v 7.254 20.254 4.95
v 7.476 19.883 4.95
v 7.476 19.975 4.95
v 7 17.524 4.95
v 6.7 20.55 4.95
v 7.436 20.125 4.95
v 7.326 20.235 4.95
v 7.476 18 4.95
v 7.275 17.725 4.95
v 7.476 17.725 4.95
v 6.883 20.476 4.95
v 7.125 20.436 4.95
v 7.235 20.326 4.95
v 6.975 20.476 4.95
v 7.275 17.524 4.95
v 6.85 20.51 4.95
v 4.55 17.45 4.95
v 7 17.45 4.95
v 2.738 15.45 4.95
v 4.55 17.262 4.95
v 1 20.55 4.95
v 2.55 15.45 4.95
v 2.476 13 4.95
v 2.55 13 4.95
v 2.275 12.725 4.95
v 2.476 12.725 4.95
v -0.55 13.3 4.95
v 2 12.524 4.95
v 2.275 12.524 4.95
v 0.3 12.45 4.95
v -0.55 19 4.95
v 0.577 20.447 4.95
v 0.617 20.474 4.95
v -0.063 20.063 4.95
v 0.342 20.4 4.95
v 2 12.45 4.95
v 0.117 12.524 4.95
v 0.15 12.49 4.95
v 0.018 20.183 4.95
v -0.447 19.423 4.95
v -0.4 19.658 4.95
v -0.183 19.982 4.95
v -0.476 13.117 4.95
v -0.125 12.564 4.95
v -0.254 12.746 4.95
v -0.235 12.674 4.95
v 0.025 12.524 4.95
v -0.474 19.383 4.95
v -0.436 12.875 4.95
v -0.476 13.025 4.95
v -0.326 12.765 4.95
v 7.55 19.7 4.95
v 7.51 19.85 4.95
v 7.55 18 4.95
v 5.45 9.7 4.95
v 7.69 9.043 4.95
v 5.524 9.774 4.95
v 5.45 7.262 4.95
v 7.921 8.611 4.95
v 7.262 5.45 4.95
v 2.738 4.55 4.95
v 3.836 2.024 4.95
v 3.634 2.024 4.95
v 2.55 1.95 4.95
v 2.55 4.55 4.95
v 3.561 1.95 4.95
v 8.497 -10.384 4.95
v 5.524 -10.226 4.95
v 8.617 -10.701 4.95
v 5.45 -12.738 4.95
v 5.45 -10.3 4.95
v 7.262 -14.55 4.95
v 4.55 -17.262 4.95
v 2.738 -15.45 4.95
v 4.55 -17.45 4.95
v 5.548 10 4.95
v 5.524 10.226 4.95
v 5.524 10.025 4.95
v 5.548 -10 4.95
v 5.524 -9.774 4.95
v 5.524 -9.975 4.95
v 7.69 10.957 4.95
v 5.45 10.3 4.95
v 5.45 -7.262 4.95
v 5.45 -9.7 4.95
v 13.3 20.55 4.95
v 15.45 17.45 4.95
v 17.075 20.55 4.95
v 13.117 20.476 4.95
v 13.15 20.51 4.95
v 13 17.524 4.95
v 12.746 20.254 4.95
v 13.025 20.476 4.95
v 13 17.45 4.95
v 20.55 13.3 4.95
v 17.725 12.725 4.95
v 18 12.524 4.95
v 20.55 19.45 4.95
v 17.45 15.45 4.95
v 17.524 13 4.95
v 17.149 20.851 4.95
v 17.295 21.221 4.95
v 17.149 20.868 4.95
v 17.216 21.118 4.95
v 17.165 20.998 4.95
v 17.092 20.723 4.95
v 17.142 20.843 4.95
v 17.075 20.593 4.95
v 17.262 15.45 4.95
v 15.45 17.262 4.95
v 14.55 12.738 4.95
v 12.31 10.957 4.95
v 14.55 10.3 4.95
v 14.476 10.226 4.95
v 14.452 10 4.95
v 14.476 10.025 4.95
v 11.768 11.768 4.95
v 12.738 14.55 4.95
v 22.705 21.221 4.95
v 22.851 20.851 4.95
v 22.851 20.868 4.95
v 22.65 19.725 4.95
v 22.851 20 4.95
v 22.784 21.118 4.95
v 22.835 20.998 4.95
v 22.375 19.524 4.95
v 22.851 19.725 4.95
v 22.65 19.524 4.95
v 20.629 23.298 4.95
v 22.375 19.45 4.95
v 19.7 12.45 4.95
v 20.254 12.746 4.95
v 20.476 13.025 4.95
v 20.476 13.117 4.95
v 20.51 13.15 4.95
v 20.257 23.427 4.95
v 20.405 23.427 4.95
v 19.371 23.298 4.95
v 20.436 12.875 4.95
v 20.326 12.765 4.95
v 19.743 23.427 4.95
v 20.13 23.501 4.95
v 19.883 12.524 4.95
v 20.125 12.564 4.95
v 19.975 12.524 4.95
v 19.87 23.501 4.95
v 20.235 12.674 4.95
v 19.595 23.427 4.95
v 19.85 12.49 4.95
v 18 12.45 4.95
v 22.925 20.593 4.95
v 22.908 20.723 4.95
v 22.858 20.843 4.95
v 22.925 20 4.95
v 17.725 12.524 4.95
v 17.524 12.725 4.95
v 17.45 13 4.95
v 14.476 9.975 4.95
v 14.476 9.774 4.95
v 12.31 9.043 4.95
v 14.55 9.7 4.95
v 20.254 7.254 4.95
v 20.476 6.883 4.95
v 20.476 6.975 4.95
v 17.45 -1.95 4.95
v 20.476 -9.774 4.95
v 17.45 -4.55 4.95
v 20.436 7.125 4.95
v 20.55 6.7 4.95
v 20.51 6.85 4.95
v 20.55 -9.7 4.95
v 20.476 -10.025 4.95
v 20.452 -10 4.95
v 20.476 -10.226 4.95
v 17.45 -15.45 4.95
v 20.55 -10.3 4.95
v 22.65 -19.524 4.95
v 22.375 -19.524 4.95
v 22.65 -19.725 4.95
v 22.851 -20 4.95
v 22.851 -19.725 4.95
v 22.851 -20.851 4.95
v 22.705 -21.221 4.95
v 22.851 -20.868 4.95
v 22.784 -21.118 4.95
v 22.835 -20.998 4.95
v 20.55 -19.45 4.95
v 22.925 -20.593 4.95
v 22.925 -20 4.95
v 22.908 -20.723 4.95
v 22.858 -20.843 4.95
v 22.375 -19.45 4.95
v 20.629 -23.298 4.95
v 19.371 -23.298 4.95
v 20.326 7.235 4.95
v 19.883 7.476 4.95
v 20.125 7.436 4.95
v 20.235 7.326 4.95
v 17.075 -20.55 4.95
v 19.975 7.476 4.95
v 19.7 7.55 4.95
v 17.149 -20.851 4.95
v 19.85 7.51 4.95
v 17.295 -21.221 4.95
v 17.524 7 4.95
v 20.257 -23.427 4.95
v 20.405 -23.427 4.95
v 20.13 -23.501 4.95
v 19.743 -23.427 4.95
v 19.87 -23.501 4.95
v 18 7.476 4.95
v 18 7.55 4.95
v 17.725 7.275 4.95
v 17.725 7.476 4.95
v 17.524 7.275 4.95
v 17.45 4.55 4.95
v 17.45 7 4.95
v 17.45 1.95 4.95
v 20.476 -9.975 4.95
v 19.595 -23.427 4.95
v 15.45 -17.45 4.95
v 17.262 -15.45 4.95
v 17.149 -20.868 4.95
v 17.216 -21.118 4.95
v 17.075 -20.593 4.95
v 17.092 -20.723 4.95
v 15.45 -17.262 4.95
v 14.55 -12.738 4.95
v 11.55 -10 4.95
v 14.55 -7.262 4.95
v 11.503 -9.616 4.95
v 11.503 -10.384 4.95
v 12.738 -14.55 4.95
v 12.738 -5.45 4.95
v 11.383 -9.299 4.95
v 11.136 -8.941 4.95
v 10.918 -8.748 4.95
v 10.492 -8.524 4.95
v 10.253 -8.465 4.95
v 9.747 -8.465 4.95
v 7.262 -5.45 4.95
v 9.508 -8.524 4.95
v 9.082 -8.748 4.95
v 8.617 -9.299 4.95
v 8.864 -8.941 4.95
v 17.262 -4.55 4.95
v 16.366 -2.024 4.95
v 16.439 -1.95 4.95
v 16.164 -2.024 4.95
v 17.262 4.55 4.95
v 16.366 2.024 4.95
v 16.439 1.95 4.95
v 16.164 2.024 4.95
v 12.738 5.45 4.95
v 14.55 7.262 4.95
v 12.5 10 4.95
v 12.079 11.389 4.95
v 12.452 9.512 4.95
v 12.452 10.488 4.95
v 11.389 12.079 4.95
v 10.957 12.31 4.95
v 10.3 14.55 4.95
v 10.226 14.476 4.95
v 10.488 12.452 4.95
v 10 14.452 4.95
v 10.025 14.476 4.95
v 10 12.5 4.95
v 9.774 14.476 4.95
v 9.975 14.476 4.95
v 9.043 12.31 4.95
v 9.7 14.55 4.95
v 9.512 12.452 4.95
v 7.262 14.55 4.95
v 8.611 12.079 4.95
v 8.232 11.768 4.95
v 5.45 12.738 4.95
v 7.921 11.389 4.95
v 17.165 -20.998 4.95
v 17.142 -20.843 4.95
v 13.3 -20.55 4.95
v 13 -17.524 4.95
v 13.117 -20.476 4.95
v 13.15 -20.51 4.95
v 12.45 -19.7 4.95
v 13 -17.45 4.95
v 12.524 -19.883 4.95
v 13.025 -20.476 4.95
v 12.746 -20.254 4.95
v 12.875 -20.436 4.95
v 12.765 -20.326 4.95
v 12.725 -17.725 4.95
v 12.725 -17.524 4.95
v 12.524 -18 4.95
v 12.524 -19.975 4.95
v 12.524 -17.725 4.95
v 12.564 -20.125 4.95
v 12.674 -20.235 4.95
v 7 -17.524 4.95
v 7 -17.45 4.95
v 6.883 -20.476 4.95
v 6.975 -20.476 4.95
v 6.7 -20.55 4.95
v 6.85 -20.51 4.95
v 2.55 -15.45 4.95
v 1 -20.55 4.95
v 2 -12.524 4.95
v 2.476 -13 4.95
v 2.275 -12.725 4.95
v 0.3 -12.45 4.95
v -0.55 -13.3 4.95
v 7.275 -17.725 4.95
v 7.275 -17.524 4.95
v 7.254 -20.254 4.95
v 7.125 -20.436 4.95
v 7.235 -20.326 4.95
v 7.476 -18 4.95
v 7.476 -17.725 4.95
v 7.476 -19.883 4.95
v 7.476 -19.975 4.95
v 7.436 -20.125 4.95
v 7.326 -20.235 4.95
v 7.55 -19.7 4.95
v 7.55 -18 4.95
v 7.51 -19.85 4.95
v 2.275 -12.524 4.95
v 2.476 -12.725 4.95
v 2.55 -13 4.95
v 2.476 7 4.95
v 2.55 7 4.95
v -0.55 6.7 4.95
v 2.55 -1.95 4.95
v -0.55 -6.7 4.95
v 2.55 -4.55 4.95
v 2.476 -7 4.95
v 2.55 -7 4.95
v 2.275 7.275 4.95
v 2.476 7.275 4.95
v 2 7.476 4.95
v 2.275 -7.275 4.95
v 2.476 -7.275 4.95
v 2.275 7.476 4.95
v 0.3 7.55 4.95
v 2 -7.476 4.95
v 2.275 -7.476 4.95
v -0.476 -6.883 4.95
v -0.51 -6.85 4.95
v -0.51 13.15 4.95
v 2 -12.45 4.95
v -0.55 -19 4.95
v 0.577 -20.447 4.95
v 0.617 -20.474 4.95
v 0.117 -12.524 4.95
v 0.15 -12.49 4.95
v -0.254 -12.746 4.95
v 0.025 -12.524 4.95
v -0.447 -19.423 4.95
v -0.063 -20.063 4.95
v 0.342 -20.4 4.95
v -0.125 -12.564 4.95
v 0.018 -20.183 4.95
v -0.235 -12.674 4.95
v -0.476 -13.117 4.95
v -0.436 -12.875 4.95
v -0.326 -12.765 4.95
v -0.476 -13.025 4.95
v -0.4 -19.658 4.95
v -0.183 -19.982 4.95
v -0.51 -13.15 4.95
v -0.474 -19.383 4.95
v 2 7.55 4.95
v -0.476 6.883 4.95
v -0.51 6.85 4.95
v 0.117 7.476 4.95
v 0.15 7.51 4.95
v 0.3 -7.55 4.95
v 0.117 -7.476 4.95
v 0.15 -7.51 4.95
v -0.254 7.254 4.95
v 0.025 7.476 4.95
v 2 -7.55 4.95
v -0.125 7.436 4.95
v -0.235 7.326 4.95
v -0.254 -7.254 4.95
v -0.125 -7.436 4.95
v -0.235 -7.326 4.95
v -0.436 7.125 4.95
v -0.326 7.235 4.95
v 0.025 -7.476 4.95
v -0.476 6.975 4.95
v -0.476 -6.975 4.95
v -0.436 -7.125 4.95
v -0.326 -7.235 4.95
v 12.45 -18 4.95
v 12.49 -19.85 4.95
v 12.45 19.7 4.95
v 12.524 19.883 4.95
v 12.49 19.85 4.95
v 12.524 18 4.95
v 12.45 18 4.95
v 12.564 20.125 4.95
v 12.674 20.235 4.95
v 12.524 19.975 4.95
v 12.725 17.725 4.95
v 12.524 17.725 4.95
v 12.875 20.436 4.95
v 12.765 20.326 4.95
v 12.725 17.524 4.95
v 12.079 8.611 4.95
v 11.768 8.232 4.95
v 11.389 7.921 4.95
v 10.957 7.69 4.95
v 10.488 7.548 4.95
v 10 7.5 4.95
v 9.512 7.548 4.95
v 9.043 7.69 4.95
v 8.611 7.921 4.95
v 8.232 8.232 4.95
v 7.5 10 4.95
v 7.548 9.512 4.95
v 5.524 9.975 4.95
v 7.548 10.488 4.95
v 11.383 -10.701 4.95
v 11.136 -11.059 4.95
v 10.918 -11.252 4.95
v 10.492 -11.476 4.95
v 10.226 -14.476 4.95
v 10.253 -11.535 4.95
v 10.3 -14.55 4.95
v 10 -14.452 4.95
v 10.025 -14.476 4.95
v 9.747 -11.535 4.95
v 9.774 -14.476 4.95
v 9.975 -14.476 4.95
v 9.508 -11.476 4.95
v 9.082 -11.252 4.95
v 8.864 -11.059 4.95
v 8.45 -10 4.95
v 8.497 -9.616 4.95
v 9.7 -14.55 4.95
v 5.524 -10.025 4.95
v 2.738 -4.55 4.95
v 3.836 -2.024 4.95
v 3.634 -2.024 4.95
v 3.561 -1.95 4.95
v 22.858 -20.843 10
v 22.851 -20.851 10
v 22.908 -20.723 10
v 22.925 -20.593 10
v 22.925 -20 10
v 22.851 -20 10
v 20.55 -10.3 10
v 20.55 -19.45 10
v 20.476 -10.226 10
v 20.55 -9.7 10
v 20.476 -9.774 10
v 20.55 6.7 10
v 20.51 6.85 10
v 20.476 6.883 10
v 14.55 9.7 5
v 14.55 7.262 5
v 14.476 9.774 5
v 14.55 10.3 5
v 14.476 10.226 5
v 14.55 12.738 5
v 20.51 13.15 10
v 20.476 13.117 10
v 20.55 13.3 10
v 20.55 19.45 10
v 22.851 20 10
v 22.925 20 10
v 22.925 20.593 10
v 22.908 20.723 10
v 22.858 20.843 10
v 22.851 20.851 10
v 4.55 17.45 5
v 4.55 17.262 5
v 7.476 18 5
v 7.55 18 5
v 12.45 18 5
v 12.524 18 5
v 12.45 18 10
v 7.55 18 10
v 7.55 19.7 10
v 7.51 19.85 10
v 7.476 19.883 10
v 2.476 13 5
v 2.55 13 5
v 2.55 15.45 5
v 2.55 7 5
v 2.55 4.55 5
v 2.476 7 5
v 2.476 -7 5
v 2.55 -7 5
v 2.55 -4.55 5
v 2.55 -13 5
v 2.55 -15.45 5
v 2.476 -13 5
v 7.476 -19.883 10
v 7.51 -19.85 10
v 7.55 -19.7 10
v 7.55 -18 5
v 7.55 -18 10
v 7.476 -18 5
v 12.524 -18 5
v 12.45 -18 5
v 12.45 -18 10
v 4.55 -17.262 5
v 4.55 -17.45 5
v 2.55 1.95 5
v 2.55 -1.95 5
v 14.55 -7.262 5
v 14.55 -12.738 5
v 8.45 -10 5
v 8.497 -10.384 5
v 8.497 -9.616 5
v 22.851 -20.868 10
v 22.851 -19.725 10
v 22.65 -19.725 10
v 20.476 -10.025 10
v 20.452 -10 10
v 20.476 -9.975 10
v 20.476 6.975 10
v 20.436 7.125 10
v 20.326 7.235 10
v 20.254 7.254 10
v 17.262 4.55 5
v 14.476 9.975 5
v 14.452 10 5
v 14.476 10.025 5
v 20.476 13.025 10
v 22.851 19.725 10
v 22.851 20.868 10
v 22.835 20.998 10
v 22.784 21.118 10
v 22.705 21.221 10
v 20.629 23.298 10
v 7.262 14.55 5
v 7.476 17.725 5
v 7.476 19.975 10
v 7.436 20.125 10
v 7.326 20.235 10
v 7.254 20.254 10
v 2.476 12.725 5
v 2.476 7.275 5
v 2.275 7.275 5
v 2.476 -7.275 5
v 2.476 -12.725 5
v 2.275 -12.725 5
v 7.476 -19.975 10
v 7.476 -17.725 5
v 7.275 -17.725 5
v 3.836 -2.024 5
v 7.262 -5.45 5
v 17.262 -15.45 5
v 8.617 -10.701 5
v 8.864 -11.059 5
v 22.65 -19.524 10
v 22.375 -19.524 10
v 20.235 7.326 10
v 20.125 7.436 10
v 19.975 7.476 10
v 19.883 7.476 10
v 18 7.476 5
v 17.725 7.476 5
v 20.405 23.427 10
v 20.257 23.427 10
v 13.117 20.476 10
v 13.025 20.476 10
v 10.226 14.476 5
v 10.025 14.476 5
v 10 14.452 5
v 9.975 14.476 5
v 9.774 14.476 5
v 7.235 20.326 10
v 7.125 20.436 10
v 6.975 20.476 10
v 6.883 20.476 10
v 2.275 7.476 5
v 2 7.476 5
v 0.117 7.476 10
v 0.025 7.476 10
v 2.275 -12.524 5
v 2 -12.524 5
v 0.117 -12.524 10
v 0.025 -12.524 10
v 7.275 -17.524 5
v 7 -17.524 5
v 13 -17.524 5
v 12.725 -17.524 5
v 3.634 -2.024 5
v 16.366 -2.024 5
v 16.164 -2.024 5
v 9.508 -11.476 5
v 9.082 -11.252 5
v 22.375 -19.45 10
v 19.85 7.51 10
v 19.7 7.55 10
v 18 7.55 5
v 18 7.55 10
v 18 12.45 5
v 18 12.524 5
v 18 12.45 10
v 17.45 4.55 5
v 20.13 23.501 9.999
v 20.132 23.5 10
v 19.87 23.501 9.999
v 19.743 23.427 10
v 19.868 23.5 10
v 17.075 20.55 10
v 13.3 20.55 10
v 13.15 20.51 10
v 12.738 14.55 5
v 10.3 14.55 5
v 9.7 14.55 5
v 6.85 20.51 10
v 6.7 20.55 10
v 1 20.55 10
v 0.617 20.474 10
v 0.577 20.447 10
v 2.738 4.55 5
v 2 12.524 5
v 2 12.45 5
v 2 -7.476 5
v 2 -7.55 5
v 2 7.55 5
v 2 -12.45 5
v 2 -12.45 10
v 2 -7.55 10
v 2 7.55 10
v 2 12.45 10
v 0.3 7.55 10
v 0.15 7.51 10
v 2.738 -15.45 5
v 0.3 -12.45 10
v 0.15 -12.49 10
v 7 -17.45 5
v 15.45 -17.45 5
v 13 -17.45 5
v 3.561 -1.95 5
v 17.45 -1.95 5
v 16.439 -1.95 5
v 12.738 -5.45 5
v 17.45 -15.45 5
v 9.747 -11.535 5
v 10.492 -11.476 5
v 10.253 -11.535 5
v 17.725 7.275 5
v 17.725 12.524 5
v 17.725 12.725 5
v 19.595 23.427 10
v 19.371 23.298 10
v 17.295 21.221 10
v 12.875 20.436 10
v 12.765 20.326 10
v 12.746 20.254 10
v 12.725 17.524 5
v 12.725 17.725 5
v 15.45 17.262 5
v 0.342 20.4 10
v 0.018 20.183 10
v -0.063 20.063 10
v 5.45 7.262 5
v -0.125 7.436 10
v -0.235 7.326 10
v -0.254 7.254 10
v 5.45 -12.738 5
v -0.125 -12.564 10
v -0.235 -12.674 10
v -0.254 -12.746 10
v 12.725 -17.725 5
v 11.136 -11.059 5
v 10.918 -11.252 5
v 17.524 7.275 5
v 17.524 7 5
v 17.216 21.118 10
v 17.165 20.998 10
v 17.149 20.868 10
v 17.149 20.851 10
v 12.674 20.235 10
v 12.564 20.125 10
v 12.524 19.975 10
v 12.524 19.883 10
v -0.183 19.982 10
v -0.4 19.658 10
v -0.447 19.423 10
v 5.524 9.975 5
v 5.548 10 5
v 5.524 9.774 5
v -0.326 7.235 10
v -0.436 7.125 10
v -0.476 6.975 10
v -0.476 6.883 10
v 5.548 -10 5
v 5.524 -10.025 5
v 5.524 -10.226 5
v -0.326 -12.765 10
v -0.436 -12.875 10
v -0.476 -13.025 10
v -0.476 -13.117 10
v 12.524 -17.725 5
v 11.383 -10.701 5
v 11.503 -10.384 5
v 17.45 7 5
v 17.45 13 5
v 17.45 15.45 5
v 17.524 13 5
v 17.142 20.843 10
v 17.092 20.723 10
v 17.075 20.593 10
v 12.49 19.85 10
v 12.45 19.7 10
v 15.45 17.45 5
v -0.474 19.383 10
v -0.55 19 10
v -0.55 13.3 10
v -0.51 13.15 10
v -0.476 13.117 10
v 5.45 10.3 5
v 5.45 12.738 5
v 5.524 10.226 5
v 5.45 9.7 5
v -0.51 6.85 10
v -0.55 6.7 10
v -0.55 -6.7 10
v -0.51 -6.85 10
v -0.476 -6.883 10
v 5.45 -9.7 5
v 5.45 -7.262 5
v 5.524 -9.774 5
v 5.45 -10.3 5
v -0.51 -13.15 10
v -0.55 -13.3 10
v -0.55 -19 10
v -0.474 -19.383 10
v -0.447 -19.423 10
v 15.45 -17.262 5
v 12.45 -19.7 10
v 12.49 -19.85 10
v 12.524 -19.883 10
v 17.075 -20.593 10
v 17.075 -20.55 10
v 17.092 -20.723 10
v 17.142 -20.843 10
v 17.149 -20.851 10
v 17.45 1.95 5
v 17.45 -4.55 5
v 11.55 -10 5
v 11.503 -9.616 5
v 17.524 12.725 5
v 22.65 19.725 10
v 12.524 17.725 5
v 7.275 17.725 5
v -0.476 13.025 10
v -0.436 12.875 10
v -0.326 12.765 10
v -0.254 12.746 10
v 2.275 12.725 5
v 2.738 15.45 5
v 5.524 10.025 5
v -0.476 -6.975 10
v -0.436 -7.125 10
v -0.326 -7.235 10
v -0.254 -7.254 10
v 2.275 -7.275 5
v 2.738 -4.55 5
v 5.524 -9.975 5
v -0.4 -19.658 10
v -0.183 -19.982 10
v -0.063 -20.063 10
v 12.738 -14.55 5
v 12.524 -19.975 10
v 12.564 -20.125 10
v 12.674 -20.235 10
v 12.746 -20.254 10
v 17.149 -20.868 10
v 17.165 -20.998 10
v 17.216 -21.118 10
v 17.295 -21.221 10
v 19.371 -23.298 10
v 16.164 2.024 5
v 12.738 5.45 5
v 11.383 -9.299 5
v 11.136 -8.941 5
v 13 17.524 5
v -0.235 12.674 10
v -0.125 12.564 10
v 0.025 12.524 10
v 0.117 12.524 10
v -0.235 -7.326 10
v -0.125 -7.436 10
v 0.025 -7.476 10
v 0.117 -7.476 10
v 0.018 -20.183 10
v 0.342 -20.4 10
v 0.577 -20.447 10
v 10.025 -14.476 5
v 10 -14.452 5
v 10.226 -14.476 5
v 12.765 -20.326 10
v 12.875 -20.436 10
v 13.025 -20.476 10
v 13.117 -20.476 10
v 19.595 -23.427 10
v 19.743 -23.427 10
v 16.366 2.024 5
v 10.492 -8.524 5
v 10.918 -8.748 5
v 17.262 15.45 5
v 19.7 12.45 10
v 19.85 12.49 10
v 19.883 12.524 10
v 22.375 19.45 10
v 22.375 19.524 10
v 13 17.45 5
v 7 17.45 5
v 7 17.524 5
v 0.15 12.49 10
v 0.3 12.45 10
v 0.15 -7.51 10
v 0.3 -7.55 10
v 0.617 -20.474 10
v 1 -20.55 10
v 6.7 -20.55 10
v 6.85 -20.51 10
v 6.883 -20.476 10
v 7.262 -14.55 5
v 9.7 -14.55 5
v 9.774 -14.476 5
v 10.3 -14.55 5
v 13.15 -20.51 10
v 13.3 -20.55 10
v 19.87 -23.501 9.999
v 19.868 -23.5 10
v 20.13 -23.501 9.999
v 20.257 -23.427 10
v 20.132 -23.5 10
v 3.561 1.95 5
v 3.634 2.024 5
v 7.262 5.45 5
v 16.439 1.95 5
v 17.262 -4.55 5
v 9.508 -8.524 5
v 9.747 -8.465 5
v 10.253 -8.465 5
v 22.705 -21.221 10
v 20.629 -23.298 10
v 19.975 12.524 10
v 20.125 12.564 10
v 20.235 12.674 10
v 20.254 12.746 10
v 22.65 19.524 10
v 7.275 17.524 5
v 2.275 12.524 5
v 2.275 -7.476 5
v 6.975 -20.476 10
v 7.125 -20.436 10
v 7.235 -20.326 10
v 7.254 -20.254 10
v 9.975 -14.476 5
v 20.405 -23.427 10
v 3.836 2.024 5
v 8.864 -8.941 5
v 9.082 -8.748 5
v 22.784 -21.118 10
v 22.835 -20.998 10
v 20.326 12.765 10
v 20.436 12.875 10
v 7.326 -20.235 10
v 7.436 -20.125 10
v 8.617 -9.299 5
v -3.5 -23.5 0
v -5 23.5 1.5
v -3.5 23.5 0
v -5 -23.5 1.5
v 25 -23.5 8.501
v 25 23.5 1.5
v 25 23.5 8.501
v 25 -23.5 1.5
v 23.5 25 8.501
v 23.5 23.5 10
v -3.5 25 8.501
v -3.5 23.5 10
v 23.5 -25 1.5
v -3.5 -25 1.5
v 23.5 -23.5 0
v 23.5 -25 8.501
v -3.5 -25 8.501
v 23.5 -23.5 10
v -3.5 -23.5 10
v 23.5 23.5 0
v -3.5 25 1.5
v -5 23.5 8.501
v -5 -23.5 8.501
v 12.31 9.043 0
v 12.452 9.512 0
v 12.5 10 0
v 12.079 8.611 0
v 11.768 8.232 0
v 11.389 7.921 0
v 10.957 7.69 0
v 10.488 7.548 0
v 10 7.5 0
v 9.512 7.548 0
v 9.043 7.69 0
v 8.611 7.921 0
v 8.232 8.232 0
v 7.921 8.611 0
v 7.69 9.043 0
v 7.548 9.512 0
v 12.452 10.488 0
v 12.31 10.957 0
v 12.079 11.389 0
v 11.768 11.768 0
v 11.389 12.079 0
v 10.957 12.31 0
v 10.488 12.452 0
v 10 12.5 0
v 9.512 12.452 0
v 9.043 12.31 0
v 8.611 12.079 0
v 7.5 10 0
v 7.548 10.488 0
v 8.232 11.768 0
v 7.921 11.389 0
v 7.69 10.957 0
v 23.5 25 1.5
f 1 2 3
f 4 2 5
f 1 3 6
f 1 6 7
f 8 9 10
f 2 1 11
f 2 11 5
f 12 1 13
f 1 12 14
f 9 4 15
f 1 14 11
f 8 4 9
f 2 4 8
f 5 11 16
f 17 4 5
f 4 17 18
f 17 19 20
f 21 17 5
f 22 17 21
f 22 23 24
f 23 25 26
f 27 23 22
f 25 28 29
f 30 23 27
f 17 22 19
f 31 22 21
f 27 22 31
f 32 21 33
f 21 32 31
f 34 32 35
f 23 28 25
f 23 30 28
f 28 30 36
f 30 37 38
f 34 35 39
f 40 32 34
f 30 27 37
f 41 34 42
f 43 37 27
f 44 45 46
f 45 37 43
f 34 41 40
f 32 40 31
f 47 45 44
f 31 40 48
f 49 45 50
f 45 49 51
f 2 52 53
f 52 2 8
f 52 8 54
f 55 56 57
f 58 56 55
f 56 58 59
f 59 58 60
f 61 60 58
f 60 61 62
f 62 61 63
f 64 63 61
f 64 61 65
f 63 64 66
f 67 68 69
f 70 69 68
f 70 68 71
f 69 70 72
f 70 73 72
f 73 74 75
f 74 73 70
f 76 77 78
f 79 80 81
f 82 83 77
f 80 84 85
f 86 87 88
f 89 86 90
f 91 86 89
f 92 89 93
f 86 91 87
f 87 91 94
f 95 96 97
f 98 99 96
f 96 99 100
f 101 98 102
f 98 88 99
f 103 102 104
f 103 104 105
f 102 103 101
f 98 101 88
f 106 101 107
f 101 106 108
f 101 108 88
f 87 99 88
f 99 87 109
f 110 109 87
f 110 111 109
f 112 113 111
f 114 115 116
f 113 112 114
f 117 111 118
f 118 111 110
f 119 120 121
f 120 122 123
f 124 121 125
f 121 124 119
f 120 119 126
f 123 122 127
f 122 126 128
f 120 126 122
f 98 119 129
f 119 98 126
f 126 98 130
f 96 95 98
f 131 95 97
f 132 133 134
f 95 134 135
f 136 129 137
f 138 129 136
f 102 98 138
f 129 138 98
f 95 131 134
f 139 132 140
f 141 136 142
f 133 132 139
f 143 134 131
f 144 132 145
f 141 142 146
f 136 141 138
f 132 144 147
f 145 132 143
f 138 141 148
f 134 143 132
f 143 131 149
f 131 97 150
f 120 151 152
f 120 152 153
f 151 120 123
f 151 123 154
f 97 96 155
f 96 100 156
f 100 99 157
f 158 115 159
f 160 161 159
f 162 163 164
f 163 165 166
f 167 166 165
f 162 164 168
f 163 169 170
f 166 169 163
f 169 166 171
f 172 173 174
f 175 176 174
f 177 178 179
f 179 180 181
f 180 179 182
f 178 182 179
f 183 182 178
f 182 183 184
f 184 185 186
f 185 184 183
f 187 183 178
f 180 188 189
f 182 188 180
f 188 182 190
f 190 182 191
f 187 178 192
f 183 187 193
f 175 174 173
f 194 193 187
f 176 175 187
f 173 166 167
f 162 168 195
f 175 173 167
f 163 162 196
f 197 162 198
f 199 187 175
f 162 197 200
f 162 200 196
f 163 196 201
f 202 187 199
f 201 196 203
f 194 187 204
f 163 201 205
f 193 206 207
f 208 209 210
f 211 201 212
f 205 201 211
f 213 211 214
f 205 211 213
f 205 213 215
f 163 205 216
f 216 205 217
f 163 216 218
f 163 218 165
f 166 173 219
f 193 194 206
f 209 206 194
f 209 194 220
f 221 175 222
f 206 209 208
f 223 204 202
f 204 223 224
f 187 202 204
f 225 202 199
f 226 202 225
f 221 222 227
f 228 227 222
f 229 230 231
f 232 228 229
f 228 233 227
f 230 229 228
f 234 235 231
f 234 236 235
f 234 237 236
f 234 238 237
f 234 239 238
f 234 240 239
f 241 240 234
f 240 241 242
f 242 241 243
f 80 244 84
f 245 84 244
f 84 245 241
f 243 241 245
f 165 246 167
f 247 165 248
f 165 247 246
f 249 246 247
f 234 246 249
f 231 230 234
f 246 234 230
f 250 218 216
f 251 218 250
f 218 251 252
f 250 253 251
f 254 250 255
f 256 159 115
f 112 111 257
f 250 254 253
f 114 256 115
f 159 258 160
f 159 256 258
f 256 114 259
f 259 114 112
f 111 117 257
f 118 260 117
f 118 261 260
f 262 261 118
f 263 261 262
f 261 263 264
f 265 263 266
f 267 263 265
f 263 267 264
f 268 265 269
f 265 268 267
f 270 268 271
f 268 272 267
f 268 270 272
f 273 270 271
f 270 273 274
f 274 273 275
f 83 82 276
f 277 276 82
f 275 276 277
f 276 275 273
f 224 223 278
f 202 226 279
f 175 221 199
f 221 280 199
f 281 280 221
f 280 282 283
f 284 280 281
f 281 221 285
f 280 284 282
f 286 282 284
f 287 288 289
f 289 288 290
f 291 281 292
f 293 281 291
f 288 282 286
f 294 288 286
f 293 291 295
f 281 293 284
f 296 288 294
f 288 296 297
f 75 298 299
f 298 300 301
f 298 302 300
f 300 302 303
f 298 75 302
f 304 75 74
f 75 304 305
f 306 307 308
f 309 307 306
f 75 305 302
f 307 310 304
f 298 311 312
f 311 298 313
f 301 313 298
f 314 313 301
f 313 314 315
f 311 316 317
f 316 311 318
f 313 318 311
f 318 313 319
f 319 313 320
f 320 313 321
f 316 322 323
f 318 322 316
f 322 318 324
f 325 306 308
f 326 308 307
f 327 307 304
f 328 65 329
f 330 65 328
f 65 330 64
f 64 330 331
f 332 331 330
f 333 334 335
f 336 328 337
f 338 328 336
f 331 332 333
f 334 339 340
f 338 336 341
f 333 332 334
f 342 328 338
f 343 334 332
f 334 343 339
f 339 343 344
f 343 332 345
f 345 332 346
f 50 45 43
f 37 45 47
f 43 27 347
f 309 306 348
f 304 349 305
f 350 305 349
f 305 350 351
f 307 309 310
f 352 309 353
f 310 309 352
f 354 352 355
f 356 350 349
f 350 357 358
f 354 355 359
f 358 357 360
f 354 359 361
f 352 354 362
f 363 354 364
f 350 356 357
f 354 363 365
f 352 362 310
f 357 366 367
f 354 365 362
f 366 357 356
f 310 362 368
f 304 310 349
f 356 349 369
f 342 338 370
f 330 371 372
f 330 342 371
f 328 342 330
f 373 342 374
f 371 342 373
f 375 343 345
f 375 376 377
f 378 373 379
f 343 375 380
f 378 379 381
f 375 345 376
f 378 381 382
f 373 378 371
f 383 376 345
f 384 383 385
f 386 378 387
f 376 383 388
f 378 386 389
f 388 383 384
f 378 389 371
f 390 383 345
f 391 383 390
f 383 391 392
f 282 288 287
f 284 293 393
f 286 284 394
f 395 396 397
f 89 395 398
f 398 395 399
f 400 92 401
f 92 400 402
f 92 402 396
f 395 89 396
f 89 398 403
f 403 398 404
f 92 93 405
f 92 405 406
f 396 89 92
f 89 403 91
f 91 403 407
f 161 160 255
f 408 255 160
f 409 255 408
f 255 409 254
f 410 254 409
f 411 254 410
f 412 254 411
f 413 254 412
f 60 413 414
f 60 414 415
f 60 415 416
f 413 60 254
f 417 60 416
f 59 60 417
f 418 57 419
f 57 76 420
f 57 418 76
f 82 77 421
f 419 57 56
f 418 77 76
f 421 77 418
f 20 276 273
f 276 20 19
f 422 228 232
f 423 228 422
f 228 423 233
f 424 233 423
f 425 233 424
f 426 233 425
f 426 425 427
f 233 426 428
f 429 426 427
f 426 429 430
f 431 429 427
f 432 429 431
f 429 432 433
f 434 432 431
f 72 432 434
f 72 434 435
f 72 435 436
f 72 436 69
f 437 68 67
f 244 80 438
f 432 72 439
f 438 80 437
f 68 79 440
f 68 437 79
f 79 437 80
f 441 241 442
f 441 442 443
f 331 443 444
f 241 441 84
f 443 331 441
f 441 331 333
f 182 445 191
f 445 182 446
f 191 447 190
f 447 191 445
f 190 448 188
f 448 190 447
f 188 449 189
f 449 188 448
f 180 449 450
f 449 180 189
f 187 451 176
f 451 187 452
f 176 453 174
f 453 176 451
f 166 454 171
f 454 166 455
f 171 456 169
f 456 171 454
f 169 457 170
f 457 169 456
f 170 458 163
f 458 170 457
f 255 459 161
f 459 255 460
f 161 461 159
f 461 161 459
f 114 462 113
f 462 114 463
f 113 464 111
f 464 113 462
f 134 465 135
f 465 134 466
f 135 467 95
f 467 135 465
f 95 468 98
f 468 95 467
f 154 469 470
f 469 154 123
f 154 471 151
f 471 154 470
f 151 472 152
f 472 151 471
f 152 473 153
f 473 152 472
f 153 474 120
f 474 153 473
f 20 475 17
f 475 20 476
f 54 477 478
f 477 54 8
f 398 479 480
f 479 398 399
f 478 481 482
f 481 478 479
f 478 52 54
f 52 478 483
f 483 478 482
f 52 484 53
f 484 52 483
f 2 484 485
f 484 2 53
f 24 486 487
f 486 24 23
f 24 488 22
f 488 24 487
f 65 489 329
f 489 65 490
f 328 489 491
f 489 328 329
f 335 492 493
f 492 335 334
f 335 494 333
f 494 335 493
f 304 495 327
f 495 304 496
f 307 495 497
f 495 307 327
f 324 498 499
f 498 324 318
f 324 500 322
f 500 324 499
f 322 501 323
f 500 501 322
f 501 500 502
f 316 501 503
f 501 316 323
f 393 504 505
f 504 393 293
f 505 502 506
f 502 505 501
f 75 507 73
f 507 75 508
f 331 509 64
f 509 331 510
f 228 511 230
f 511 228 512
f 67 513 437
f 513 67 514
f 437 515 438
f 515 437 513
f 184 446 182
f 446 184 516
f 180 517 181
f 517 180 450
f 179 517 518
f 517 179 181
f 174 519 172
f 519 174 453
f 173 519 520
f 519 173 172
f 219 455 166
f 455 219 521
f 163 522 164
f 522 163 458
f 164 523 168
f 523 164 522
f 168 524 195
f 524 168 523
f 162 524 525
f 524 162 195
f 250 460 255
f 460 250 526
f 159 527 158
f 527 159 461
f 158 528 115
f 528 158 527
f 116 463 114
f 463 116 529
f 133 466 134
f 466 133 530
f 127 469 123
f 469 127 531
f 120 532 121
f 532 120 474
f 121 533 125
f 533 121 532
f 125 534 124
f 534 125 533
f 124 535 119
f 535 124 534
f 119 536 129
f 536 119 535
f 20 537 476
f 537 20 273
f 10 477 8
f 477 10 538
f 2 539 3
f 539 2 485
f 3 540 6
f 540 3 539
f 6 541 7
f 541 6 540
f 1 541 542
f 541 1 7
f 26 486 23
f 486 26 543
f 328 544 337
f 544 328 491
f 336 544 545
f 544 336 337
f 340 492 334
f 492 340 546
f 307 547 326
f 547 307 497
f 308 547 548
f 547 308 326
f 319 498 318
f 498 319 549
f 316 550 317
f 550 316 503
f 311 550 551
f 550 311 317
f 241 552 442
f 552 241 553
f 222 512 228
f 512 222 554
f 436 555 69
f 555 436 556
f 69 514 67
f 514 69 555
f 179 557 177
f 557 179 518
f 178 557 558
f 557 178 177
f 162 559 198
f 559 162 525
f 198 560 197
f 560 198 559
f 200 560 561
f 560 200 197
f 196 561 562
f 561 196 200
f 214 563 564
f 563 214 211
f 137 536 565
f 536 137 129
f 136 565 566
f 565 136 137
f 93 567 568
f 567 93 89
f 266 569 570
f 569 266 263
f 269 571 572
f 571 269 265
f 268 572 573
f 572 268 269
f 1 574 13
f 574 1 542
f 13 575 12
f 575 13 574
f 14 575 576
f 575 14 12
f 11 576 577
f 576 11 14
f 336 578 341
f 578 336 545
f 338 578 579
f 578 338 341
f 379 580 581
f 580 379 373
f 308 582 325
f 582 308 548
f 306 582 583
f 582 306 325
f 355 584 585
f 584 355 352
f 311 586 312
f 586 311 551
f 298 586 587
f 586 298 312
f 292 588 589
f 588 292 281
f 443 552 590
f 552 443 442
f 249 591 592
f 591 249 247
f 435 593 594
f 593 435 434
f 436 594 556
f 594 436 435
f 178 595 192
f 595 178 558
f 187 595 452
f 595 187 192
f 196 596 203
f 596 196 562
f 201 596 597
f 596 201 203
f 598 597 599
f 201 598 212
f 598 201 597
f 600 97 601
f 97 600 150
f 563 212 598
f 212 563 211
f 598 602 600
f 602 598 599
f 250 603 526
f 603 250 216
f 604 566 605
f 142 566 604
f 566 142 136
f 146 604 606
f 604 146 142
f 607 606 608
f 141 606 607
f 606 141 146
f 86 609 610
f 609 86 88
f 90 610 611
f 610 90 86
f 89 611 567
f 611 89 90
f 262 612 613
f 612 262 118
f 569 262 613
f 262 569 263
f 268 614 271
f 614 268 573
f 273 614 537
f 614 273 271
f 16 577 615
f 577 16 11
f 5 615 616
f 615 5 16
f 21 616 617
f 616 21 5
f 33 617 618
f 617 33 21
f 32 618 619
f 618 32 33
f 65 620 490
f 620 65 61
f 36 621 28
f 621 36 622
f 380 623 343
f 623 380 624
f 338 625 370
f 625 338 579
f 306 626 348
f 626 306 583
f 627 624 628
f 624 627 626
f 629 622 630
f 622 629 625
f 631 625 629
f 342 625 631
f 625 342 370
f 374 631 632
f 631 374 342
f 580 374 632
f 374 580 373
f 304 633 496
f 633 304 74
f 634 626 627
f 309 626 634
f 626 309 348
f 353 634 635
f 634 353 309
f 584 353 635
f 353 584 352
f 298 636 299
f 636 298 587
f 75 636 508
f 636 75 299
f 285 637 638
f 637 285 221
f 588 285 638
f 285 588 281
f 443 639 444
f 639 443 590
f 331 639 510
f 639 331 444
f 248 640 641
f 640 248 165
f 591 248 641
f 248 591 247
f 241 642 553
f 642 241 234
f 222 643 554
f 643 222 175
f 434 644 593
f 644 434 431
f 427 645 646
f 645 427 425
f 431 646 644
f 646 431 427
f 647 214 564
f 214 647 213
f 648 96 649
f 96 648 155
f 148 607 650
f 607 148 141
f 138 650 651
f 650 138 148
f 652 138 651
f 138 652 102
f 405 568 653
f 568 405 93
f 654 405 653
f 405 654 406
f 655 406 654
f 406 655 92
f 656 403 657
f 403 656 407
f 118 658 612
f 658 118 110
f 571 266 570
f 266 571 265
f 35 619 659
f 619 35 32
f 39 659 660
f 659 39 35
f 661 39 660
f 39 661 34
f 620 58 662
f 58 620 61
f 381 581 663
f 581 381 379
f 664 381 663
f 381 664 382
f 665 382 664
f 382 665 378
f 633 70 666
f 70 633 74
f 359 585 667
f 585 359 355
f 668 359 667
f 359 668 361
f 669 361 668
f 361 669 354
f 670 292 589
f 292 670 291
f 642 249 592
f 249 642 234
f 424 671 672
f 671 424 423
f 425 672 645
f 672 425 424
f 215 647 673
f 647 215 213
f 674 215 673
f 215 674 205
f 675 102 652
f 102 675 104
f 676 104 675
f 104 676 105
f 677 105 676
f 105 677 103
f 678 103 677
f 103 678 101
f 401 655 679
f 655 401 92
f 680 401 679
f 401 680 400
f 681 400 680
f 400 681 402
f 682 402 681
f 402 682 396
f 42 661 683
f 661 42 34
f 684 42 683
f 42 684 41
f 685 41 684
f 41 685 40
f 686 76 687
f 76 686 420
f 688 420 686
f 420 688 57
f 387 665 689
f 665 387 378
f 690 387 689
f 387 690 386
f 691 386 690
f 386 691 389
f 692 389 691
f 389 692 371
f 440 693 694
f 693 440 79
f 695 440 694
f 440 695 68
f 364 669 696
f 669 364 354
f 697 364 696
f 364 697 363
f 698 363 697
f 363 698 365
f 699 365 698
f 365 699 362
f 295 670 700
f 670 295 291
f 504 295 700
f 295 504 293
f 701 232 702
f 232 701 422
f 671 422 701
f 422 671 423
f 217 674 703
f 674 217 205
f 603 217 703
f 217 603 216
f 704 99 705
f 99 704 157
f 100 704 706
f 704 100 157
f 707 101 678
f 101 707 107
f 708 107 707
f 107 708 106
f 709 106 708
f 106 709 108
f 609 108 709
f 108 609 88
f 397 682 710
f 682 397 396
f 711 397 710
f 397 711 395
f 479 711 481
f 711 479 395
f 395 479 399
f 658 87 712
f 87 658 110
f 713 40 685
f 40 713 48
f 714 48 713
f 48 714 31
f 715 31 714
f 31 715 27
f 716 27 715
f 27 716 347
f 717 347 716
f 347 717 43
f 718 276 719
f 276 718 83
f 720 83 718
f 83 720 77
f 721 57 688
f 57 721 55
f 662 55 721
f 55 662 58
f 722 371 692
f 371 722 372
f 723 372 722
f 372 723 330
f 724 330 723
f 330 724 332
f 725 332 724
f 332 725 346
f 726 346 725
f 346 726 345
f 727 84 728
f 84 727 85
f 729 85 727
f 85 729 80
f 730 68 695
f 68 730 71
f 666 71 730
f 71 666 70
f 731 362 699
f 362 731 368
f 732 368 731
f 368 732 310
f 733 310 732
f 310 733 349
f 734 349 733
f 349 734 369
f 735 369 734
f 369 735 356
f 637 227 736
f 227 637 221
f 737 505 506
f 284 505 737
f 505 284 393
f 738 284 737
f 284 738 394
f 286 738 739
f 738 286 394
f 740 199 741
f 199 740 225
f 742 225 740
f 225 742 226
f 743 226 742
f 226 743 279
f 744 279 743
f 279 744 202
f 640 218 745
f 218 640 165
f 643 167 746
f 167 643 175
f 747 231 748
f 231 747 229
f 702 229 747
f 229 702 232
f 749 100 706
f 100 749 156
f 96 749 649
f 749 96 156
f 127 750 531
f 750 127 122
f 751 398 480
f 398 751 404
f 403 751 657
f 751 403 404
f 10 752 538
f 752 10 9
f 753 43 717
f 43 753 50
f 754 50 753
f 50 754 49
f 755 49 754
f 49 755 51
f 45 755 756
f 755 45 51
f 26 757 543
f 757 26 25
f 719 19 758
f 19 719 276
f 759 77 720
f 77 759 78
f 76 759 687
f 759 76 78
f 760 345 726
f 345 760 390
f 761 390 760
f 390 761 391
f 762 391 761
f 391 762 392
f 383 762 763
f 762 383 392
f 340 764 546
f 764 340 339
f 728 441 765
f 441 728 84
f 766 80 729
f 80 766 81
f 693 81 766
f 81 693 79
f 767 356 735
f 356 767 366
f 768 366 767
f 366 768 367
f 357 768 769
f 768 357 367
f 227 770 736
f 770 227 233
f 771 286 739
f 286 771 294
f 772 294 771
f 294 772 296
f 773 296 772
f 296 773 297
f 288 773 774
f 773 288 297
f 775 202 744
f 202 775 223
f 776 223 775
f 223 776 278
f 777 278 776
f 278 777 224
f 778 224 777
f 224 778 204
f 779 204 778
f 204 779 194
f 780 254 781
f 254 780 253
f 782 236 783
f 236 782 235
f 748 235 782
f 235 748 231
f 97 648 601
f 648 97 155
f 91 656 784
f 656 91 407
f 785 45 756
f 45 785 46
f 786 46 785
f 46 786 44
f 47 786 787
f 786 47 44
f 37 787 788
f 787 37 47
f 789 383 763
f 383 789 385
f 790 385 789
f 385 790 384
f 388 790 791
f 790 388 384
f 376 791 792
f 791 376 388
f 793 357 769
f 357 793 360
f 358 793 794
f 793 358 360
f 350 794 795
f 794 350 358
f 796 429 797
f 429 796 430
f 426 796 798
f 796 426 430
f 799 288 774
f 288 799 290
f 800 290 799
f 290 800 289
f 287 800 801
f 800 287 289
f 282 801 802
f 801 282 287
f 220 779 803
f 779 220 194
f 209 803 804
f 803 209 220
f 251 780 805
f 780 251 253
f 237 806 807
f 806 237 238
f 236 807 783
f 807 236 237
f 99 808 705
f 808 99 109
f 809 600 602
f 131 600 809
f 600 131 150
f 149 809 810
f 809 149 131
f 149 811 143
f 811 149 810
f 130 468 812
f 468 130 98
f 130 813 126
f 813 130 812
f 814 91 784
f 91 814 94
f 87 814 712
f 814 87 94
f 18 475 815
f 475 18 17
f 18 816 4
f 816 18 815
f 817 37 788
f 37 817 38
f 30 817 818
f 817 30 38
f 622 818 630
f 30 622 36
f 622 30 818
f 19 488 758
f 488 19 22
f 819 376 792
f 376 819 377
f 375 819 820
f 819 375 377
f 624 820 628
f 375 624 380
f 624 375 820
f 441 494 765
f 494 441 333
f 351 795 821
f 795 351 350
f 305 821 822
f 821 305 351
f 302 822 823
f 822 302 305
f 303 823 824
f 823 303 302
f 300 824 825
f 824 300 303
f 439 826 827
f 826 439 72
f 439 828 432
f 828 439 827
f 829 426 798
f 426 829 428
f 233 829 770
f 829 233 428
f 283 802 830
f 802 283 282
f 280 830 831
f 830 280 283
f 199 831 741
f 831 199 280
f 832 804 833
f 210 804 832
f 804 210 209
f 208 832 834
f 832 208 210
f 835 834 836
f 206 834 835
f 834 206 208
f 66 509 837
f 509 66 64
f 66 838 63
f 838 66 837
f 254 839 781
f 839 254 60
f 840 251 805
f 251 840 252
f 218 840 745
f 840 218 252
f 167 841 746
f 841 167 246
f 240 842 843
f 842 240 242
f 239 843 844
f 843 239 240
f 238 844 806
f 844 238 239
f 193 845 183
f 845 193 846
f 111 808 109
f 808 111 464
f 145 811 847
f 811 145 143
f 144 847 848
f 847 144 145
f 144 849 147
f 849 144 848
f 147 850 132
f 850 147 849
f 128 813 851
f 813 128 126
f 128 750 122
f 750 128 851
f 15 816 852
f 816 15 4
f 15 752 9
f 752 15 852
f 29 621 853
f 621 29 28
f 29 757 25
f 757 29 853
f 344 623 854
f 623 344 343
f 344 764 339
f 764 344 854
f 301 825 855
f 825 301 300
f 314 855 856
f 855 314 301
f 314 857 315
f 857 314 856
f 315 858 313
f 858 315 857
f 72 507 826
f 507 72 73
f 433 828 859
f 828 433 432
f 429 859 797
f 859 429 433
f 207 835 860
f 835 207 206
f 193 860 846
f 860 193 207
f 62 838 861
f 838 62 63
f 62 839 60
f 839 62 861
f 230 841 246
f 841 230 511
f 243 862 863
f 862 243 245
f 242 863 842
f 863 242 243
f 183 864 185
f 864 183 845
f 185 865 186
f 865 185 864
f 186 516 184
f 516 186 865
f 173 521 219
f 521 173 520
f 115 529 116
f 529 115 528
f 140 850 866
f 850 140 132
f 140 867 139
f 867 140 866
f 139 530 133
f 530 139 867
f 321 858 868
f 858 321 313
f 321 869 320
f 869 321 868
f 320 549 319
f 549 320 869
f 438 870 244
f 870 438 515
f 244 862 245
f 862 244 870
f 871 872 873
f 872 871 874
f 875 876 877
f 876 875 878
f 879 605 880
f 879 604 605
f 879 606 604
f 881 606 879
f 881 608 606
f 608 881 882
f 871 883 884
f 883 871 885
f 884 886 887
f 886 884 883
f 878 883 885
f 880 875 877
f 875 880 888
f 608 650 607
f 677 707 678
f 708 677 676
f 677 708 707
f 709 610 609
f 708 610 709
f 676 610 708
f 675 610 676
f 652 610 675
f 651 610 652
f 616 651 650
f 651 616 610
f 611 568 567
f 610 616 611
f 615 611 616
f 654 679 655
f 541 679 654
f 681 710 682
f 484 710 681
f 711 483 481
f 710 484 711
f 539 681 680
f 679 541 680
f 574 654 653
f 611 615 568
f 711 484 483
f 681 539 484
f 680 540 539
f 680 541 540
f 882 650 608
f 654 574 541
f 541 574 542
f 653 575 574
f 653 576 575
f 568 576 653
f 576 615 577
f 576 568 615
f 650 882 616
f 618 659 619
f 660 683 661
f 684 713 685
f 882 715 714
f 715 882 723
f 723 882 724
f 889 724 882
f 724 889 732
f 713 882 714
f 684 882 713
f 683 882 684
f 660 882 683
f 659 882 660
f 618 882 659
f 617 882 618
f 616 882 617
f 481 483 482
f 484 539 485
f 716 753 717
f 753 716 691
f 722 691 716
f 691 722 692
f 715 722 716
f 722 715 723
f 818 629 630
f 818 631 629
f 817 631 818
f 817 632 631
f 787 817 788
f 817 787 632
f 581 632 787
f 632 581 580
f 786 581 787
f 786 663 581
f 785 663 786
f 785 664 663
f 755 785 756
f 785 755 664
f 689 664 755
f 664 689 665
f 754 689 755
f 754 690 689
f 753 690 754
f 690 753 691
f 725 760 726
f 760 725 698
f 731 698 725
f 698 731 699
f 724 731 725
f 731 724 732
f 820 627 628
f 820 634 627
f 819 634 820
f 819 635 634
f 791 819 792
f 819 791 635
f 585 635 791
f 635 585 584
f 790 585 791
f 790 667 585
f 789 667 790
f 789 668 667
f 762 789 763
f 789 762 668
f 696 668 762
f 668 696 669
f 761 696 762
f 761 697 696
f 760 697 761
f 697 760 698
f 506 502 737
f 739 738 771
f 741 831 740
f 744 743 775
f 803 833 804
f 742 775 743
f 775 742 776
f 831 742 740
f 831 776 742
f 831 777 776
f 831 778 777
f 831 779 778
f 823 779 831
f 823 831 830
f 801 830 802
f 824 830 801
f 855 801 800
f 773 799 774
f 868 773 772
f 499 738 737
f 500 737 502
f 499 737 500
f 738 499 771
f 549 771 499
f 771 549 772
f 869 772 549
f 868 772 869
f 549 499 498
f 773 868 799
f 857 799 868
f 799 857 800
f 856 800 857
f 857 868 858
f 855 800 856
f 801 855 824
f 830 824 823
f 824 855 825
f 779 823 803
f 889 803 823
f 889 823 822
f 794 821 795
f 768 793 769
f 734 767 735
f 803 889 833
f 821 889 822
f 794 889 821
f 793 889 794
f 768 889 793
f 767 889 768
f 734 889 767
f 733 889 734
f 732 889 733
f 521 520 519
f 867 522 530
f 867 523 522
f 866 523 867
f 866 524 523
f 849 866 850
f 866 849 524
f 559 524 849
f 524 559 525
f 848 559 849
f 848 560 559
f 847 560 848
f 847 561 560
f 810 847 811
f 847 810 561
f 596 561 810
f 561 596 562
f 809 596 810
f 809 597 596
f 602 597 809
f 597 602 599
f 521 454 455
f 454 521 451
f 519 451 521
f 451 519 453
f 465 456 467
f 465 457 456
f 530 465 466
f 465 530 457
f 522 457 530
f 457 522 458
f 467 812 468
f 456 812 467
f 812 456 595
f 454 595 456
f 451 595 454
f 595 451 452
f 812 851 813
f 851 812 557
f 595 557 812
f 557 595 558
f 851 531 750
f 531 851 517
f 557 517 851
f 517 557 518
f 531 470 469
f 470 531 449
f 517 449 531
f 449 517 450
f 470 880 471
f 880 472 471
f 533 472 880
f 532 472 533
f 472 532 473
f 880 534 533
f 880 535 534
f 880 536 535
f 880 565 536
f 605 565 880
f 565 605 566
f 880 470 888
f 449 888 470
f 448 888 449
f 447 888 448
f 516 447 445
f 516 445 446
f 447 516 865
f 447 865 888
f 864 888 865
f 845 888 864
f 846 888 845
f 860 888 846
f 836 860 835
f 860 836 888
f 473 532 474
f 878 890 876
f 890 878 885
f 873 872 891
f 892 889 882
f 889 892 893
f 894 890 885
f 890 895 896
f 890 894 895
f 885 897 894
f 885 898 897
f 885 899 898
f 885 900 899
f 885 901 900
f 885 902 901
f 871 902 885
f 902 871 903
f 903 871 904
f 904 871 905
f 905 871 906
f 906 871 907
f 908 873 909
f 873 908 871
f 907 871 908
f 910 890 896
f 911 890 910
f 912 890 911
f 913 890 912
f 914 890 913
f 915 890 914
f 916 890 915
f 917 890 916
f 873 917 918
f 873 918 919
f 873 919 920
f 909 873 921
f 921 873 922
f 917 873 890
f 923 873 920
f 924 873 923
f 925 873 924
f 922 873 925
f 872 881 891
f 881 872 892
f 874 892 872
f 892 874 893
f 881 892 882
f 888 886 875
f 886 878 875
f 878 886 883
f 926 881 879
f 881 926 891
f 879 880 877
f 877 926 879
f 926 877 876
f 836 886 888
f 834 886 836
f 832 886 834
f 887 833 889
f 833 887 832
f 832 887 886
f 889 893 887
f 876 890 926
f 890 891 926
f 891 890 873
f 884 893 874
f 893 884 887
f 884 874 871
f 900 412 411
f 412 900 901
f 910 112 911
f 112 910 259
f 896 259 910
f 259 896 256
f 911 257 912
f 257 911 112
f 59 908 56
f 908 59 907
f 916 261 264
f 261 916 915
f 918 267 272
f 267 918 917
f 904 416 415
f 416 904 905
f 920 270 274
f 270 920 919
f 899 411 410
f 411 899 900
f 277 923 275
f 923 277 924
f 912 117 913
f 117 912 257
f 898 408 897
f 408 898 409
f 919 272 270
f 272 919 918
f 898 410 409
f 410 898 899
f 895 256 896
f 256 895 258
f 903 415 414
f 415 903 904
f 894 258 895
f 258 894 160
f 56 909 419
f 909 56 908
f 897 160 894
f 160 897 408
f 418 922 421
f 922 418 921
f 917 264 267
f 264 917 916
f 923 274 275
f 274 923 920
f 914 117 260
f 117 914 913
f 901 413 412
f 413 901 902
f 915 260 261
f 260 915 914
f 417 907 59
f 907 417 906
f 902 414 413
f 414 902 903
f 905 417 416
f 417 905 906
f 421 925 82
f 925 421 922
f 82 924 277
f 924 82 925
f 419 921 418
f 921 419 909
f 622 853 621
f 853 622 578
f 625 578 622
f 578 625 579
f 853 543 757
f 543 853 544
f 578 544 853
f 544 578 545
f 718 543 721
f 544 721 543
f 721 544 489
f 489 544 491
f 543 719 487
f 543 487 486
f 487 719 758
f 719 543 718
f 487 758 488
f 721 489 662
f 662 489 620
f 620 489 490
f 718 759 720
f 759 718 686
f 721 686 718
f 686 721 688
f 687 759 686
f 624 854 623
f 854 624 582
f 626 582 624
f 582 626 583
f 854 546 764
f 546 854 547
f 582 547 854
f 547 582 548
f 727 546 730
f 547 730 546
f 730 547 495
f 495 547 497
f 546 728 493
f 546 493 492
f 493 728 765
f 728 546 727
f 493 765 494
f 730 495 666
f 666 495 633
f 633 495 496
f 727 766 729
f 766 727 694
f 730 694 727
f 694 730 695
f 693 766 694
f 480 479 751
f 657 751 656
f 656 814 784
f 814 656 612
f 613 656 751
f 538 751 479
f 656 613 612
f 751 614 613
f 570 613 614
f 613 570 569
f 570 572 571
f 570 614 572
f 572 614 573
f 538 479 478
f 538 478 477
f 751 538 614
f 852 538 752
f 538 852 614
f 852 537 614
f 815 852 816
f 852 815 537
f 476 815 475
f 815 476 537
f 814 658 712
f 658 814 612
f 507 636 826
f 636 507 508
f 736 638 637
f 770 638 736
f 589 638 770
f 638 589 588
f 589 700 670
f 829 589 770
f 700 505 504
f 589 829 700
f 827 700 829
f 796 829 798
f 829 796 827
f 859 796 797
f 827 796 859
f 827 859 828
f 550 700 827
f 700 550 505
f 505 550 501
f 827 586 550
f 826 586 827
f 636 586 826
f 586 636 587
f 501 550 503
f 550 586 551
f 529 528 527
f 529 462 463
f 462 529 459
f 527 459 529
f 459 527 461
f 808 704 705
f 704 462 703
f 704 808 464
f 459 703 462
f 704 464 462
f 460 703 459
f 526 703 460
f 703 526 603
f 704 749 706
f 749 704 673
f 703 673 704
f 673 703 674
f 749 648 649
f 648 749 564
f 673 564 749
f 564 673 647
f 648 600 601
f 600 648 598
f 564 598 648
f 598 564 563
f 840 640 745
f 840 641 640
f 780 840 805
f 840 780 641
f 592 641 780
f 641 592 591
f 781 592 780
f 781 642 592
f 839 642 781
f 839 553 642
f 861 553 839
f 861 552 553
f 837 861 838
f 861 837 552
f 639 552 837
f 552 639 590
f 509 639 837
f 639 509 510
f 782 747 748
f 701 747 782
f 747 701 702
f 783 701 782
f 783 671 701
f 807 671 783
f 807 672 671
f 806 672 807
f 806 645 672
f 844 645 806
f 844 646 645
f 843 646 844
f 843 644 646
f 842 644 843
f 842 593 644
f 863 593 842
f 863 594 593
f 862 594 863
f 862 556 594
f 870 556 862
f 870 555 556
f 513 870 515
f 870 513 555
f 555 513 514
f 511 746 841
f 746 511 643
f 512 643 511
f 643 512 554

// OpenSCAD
// file: scad/tapercube.scad
module tapercube(width=10, height=10, depth=10, taper=3.0) {
  plane = 0.001;
  hull() {
    translate([taper/2,taper/2,0])
      cube([width-taper, height-taper, plane]);
    translate([0,0,taper/2]) {
      translate([0,taper/2])
        cube([width, height-taper, plane]);
      translate([taper/2,0])
        cube([width-taper, height, plane]);
    }

    translate([taper/2,taper/2,depth-plane])
      cube([width-taper, height-taper, plane]);
    translate([0,0,depth-taper/2]) {
      translate([0,taper/2])
        cube([width, height-taper, plane]);
      translate([taper/2,0])
        cube([width-taper, height, plane]);
    }
  }
}
// main file
include <scad/tapercube.scad>;

module makerslide(h=100) {
	linear_extrude(
		file="scad/makerslide_extrusion_profile.dxf", layer="makerslide",
		height=h, center=true, convexity=10);
}

module wiggle(variance=0.5, deg=15.0) {
  for (i = [0 : deg : 360])
    translate([ cos(i)*variance, sin(i)*variance ])
    	child(0);
}

module cap() {
	depth = 10;
	etch_depth = 5;

	difference() {
		translate([-5, -25, 0])
			tapercube(30,50,depth, 3);

		translate([0, 0, depth-etch_depth/2])
			wiggle(0.55, 30)
				makerslide(etch_depth+0.1);

		translate([10,10,depth/2])
			cylinder(r=2.5, h=depth*2, center=true, $fn=32);

		translate([10,0,depth])
			cube([16,36,10], center=true);
	}
}

cap();
